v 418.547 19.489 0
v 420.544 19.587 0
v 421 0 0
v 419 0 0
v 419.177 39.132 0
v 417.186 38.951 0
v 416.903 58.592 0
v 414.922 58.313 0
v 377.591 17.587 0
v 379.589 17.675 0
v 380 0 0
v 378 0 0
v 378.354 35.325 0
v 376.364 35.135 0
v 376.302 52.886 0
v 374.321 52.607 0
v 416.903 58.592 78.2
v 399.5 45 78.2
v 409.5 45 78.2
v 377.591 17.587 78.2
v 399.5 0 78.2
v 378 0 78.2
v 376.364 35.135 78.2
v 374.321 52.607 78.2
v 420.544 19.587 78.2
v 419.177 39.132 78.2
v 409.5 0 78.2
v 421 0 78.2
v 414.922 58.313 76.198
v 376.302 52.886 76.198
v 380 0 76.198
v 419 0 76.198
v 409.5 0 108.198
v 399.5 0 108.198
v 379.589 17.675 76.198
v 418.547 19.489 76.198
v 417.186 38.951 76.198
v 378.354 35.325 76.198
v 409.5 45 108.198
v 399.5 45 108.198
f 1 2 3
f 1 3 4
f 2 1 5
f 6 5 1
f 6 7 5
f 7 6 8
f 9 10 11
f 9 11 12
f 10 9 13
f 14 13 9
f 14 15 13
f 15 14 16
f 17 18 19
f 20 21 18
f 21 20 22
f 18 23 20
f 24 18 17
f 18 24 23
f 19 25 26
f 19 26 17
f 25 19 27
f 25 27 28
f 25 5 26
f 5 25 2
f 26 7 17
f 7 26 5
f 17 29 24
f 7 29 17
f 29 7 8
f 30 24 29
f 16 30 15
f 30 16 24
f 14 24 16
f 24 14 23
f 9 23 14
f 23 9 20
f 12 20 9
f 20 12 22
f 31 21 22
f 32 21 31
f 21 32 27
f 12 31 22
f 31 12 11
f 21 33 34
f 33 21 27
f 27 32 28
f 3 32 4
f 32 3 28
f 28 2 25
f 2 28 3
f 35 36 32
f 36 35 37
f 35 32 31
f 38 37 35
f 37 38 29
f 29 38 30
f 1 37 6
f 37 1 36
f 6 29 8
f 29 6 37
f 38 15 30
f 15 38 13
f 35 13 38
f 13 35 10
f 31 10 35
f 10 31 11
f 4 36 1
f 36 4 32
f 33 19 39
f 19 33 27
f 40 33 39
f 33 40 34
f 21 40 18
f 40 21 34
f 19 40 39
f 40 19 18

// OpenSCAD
inner_diameter=760;
pond_thickness=39;
wall_thickness=2;
margin=0.002;
total_arc=8;
rim_height=3*25.4;

color("#BBBBBB")
difference() {
    linear_extrude(height=rim_height+wall_thickness, center=false)
        arc((inner_diameter/2)-wall_thickness, (inner_diameter+2*pond_thickness)/2+wall_thickness, 0, total_arc);
    translate([0,0,-margin]) pond_rim();
}

color("#BBBBBB")
translate([inner_diameter/2+pond_thickness/2, 0, rim_height+wall_thickness-margin])
    clamp_mount(10, 45, 30);

module clamp_mount(base_width, base_length, height) {
    cube([base_width, base_length, height]);
}

module pond_rim() {
    linear_extrude(height=3*25.4, center=false) {
        arc(inner_diameter/2, (inner_diameter+2*pond_thickness)/2, 0-margin, total_arc+margin);
    }
}

module arc(r1, r2, a1, a2, $fn=128) {
  r0 = min(r1, r2);
  r  = max(r1, r2);

  a = (a1 % 360 + 360) % 360;
  b = (a2 % 360 + 360) % 360;
  d = (b - a) % 360;
  s = d < 0 ? d + 360 : d;       // sweep in [0,360)

  if (s == 0) {
      difference() {
          circle(r=r, $fn=$fn);
          if (r0 > 0) circle(r=r0, $fn=$fn);
      }
  } else {
      k = max(3, ceil($fn * s / 360));
      outer = [ for (i=[0:k]) [ r  * cos(a + s*i/k), r  * sin(a + s*i/k) ] ];
      inner = [ for (i=[0:k]) [ r0 * cos(b - s*i/k), r0 * sin(b - s*i/k) ] ];
      polygon(concat(outer, inner));
  }
}
